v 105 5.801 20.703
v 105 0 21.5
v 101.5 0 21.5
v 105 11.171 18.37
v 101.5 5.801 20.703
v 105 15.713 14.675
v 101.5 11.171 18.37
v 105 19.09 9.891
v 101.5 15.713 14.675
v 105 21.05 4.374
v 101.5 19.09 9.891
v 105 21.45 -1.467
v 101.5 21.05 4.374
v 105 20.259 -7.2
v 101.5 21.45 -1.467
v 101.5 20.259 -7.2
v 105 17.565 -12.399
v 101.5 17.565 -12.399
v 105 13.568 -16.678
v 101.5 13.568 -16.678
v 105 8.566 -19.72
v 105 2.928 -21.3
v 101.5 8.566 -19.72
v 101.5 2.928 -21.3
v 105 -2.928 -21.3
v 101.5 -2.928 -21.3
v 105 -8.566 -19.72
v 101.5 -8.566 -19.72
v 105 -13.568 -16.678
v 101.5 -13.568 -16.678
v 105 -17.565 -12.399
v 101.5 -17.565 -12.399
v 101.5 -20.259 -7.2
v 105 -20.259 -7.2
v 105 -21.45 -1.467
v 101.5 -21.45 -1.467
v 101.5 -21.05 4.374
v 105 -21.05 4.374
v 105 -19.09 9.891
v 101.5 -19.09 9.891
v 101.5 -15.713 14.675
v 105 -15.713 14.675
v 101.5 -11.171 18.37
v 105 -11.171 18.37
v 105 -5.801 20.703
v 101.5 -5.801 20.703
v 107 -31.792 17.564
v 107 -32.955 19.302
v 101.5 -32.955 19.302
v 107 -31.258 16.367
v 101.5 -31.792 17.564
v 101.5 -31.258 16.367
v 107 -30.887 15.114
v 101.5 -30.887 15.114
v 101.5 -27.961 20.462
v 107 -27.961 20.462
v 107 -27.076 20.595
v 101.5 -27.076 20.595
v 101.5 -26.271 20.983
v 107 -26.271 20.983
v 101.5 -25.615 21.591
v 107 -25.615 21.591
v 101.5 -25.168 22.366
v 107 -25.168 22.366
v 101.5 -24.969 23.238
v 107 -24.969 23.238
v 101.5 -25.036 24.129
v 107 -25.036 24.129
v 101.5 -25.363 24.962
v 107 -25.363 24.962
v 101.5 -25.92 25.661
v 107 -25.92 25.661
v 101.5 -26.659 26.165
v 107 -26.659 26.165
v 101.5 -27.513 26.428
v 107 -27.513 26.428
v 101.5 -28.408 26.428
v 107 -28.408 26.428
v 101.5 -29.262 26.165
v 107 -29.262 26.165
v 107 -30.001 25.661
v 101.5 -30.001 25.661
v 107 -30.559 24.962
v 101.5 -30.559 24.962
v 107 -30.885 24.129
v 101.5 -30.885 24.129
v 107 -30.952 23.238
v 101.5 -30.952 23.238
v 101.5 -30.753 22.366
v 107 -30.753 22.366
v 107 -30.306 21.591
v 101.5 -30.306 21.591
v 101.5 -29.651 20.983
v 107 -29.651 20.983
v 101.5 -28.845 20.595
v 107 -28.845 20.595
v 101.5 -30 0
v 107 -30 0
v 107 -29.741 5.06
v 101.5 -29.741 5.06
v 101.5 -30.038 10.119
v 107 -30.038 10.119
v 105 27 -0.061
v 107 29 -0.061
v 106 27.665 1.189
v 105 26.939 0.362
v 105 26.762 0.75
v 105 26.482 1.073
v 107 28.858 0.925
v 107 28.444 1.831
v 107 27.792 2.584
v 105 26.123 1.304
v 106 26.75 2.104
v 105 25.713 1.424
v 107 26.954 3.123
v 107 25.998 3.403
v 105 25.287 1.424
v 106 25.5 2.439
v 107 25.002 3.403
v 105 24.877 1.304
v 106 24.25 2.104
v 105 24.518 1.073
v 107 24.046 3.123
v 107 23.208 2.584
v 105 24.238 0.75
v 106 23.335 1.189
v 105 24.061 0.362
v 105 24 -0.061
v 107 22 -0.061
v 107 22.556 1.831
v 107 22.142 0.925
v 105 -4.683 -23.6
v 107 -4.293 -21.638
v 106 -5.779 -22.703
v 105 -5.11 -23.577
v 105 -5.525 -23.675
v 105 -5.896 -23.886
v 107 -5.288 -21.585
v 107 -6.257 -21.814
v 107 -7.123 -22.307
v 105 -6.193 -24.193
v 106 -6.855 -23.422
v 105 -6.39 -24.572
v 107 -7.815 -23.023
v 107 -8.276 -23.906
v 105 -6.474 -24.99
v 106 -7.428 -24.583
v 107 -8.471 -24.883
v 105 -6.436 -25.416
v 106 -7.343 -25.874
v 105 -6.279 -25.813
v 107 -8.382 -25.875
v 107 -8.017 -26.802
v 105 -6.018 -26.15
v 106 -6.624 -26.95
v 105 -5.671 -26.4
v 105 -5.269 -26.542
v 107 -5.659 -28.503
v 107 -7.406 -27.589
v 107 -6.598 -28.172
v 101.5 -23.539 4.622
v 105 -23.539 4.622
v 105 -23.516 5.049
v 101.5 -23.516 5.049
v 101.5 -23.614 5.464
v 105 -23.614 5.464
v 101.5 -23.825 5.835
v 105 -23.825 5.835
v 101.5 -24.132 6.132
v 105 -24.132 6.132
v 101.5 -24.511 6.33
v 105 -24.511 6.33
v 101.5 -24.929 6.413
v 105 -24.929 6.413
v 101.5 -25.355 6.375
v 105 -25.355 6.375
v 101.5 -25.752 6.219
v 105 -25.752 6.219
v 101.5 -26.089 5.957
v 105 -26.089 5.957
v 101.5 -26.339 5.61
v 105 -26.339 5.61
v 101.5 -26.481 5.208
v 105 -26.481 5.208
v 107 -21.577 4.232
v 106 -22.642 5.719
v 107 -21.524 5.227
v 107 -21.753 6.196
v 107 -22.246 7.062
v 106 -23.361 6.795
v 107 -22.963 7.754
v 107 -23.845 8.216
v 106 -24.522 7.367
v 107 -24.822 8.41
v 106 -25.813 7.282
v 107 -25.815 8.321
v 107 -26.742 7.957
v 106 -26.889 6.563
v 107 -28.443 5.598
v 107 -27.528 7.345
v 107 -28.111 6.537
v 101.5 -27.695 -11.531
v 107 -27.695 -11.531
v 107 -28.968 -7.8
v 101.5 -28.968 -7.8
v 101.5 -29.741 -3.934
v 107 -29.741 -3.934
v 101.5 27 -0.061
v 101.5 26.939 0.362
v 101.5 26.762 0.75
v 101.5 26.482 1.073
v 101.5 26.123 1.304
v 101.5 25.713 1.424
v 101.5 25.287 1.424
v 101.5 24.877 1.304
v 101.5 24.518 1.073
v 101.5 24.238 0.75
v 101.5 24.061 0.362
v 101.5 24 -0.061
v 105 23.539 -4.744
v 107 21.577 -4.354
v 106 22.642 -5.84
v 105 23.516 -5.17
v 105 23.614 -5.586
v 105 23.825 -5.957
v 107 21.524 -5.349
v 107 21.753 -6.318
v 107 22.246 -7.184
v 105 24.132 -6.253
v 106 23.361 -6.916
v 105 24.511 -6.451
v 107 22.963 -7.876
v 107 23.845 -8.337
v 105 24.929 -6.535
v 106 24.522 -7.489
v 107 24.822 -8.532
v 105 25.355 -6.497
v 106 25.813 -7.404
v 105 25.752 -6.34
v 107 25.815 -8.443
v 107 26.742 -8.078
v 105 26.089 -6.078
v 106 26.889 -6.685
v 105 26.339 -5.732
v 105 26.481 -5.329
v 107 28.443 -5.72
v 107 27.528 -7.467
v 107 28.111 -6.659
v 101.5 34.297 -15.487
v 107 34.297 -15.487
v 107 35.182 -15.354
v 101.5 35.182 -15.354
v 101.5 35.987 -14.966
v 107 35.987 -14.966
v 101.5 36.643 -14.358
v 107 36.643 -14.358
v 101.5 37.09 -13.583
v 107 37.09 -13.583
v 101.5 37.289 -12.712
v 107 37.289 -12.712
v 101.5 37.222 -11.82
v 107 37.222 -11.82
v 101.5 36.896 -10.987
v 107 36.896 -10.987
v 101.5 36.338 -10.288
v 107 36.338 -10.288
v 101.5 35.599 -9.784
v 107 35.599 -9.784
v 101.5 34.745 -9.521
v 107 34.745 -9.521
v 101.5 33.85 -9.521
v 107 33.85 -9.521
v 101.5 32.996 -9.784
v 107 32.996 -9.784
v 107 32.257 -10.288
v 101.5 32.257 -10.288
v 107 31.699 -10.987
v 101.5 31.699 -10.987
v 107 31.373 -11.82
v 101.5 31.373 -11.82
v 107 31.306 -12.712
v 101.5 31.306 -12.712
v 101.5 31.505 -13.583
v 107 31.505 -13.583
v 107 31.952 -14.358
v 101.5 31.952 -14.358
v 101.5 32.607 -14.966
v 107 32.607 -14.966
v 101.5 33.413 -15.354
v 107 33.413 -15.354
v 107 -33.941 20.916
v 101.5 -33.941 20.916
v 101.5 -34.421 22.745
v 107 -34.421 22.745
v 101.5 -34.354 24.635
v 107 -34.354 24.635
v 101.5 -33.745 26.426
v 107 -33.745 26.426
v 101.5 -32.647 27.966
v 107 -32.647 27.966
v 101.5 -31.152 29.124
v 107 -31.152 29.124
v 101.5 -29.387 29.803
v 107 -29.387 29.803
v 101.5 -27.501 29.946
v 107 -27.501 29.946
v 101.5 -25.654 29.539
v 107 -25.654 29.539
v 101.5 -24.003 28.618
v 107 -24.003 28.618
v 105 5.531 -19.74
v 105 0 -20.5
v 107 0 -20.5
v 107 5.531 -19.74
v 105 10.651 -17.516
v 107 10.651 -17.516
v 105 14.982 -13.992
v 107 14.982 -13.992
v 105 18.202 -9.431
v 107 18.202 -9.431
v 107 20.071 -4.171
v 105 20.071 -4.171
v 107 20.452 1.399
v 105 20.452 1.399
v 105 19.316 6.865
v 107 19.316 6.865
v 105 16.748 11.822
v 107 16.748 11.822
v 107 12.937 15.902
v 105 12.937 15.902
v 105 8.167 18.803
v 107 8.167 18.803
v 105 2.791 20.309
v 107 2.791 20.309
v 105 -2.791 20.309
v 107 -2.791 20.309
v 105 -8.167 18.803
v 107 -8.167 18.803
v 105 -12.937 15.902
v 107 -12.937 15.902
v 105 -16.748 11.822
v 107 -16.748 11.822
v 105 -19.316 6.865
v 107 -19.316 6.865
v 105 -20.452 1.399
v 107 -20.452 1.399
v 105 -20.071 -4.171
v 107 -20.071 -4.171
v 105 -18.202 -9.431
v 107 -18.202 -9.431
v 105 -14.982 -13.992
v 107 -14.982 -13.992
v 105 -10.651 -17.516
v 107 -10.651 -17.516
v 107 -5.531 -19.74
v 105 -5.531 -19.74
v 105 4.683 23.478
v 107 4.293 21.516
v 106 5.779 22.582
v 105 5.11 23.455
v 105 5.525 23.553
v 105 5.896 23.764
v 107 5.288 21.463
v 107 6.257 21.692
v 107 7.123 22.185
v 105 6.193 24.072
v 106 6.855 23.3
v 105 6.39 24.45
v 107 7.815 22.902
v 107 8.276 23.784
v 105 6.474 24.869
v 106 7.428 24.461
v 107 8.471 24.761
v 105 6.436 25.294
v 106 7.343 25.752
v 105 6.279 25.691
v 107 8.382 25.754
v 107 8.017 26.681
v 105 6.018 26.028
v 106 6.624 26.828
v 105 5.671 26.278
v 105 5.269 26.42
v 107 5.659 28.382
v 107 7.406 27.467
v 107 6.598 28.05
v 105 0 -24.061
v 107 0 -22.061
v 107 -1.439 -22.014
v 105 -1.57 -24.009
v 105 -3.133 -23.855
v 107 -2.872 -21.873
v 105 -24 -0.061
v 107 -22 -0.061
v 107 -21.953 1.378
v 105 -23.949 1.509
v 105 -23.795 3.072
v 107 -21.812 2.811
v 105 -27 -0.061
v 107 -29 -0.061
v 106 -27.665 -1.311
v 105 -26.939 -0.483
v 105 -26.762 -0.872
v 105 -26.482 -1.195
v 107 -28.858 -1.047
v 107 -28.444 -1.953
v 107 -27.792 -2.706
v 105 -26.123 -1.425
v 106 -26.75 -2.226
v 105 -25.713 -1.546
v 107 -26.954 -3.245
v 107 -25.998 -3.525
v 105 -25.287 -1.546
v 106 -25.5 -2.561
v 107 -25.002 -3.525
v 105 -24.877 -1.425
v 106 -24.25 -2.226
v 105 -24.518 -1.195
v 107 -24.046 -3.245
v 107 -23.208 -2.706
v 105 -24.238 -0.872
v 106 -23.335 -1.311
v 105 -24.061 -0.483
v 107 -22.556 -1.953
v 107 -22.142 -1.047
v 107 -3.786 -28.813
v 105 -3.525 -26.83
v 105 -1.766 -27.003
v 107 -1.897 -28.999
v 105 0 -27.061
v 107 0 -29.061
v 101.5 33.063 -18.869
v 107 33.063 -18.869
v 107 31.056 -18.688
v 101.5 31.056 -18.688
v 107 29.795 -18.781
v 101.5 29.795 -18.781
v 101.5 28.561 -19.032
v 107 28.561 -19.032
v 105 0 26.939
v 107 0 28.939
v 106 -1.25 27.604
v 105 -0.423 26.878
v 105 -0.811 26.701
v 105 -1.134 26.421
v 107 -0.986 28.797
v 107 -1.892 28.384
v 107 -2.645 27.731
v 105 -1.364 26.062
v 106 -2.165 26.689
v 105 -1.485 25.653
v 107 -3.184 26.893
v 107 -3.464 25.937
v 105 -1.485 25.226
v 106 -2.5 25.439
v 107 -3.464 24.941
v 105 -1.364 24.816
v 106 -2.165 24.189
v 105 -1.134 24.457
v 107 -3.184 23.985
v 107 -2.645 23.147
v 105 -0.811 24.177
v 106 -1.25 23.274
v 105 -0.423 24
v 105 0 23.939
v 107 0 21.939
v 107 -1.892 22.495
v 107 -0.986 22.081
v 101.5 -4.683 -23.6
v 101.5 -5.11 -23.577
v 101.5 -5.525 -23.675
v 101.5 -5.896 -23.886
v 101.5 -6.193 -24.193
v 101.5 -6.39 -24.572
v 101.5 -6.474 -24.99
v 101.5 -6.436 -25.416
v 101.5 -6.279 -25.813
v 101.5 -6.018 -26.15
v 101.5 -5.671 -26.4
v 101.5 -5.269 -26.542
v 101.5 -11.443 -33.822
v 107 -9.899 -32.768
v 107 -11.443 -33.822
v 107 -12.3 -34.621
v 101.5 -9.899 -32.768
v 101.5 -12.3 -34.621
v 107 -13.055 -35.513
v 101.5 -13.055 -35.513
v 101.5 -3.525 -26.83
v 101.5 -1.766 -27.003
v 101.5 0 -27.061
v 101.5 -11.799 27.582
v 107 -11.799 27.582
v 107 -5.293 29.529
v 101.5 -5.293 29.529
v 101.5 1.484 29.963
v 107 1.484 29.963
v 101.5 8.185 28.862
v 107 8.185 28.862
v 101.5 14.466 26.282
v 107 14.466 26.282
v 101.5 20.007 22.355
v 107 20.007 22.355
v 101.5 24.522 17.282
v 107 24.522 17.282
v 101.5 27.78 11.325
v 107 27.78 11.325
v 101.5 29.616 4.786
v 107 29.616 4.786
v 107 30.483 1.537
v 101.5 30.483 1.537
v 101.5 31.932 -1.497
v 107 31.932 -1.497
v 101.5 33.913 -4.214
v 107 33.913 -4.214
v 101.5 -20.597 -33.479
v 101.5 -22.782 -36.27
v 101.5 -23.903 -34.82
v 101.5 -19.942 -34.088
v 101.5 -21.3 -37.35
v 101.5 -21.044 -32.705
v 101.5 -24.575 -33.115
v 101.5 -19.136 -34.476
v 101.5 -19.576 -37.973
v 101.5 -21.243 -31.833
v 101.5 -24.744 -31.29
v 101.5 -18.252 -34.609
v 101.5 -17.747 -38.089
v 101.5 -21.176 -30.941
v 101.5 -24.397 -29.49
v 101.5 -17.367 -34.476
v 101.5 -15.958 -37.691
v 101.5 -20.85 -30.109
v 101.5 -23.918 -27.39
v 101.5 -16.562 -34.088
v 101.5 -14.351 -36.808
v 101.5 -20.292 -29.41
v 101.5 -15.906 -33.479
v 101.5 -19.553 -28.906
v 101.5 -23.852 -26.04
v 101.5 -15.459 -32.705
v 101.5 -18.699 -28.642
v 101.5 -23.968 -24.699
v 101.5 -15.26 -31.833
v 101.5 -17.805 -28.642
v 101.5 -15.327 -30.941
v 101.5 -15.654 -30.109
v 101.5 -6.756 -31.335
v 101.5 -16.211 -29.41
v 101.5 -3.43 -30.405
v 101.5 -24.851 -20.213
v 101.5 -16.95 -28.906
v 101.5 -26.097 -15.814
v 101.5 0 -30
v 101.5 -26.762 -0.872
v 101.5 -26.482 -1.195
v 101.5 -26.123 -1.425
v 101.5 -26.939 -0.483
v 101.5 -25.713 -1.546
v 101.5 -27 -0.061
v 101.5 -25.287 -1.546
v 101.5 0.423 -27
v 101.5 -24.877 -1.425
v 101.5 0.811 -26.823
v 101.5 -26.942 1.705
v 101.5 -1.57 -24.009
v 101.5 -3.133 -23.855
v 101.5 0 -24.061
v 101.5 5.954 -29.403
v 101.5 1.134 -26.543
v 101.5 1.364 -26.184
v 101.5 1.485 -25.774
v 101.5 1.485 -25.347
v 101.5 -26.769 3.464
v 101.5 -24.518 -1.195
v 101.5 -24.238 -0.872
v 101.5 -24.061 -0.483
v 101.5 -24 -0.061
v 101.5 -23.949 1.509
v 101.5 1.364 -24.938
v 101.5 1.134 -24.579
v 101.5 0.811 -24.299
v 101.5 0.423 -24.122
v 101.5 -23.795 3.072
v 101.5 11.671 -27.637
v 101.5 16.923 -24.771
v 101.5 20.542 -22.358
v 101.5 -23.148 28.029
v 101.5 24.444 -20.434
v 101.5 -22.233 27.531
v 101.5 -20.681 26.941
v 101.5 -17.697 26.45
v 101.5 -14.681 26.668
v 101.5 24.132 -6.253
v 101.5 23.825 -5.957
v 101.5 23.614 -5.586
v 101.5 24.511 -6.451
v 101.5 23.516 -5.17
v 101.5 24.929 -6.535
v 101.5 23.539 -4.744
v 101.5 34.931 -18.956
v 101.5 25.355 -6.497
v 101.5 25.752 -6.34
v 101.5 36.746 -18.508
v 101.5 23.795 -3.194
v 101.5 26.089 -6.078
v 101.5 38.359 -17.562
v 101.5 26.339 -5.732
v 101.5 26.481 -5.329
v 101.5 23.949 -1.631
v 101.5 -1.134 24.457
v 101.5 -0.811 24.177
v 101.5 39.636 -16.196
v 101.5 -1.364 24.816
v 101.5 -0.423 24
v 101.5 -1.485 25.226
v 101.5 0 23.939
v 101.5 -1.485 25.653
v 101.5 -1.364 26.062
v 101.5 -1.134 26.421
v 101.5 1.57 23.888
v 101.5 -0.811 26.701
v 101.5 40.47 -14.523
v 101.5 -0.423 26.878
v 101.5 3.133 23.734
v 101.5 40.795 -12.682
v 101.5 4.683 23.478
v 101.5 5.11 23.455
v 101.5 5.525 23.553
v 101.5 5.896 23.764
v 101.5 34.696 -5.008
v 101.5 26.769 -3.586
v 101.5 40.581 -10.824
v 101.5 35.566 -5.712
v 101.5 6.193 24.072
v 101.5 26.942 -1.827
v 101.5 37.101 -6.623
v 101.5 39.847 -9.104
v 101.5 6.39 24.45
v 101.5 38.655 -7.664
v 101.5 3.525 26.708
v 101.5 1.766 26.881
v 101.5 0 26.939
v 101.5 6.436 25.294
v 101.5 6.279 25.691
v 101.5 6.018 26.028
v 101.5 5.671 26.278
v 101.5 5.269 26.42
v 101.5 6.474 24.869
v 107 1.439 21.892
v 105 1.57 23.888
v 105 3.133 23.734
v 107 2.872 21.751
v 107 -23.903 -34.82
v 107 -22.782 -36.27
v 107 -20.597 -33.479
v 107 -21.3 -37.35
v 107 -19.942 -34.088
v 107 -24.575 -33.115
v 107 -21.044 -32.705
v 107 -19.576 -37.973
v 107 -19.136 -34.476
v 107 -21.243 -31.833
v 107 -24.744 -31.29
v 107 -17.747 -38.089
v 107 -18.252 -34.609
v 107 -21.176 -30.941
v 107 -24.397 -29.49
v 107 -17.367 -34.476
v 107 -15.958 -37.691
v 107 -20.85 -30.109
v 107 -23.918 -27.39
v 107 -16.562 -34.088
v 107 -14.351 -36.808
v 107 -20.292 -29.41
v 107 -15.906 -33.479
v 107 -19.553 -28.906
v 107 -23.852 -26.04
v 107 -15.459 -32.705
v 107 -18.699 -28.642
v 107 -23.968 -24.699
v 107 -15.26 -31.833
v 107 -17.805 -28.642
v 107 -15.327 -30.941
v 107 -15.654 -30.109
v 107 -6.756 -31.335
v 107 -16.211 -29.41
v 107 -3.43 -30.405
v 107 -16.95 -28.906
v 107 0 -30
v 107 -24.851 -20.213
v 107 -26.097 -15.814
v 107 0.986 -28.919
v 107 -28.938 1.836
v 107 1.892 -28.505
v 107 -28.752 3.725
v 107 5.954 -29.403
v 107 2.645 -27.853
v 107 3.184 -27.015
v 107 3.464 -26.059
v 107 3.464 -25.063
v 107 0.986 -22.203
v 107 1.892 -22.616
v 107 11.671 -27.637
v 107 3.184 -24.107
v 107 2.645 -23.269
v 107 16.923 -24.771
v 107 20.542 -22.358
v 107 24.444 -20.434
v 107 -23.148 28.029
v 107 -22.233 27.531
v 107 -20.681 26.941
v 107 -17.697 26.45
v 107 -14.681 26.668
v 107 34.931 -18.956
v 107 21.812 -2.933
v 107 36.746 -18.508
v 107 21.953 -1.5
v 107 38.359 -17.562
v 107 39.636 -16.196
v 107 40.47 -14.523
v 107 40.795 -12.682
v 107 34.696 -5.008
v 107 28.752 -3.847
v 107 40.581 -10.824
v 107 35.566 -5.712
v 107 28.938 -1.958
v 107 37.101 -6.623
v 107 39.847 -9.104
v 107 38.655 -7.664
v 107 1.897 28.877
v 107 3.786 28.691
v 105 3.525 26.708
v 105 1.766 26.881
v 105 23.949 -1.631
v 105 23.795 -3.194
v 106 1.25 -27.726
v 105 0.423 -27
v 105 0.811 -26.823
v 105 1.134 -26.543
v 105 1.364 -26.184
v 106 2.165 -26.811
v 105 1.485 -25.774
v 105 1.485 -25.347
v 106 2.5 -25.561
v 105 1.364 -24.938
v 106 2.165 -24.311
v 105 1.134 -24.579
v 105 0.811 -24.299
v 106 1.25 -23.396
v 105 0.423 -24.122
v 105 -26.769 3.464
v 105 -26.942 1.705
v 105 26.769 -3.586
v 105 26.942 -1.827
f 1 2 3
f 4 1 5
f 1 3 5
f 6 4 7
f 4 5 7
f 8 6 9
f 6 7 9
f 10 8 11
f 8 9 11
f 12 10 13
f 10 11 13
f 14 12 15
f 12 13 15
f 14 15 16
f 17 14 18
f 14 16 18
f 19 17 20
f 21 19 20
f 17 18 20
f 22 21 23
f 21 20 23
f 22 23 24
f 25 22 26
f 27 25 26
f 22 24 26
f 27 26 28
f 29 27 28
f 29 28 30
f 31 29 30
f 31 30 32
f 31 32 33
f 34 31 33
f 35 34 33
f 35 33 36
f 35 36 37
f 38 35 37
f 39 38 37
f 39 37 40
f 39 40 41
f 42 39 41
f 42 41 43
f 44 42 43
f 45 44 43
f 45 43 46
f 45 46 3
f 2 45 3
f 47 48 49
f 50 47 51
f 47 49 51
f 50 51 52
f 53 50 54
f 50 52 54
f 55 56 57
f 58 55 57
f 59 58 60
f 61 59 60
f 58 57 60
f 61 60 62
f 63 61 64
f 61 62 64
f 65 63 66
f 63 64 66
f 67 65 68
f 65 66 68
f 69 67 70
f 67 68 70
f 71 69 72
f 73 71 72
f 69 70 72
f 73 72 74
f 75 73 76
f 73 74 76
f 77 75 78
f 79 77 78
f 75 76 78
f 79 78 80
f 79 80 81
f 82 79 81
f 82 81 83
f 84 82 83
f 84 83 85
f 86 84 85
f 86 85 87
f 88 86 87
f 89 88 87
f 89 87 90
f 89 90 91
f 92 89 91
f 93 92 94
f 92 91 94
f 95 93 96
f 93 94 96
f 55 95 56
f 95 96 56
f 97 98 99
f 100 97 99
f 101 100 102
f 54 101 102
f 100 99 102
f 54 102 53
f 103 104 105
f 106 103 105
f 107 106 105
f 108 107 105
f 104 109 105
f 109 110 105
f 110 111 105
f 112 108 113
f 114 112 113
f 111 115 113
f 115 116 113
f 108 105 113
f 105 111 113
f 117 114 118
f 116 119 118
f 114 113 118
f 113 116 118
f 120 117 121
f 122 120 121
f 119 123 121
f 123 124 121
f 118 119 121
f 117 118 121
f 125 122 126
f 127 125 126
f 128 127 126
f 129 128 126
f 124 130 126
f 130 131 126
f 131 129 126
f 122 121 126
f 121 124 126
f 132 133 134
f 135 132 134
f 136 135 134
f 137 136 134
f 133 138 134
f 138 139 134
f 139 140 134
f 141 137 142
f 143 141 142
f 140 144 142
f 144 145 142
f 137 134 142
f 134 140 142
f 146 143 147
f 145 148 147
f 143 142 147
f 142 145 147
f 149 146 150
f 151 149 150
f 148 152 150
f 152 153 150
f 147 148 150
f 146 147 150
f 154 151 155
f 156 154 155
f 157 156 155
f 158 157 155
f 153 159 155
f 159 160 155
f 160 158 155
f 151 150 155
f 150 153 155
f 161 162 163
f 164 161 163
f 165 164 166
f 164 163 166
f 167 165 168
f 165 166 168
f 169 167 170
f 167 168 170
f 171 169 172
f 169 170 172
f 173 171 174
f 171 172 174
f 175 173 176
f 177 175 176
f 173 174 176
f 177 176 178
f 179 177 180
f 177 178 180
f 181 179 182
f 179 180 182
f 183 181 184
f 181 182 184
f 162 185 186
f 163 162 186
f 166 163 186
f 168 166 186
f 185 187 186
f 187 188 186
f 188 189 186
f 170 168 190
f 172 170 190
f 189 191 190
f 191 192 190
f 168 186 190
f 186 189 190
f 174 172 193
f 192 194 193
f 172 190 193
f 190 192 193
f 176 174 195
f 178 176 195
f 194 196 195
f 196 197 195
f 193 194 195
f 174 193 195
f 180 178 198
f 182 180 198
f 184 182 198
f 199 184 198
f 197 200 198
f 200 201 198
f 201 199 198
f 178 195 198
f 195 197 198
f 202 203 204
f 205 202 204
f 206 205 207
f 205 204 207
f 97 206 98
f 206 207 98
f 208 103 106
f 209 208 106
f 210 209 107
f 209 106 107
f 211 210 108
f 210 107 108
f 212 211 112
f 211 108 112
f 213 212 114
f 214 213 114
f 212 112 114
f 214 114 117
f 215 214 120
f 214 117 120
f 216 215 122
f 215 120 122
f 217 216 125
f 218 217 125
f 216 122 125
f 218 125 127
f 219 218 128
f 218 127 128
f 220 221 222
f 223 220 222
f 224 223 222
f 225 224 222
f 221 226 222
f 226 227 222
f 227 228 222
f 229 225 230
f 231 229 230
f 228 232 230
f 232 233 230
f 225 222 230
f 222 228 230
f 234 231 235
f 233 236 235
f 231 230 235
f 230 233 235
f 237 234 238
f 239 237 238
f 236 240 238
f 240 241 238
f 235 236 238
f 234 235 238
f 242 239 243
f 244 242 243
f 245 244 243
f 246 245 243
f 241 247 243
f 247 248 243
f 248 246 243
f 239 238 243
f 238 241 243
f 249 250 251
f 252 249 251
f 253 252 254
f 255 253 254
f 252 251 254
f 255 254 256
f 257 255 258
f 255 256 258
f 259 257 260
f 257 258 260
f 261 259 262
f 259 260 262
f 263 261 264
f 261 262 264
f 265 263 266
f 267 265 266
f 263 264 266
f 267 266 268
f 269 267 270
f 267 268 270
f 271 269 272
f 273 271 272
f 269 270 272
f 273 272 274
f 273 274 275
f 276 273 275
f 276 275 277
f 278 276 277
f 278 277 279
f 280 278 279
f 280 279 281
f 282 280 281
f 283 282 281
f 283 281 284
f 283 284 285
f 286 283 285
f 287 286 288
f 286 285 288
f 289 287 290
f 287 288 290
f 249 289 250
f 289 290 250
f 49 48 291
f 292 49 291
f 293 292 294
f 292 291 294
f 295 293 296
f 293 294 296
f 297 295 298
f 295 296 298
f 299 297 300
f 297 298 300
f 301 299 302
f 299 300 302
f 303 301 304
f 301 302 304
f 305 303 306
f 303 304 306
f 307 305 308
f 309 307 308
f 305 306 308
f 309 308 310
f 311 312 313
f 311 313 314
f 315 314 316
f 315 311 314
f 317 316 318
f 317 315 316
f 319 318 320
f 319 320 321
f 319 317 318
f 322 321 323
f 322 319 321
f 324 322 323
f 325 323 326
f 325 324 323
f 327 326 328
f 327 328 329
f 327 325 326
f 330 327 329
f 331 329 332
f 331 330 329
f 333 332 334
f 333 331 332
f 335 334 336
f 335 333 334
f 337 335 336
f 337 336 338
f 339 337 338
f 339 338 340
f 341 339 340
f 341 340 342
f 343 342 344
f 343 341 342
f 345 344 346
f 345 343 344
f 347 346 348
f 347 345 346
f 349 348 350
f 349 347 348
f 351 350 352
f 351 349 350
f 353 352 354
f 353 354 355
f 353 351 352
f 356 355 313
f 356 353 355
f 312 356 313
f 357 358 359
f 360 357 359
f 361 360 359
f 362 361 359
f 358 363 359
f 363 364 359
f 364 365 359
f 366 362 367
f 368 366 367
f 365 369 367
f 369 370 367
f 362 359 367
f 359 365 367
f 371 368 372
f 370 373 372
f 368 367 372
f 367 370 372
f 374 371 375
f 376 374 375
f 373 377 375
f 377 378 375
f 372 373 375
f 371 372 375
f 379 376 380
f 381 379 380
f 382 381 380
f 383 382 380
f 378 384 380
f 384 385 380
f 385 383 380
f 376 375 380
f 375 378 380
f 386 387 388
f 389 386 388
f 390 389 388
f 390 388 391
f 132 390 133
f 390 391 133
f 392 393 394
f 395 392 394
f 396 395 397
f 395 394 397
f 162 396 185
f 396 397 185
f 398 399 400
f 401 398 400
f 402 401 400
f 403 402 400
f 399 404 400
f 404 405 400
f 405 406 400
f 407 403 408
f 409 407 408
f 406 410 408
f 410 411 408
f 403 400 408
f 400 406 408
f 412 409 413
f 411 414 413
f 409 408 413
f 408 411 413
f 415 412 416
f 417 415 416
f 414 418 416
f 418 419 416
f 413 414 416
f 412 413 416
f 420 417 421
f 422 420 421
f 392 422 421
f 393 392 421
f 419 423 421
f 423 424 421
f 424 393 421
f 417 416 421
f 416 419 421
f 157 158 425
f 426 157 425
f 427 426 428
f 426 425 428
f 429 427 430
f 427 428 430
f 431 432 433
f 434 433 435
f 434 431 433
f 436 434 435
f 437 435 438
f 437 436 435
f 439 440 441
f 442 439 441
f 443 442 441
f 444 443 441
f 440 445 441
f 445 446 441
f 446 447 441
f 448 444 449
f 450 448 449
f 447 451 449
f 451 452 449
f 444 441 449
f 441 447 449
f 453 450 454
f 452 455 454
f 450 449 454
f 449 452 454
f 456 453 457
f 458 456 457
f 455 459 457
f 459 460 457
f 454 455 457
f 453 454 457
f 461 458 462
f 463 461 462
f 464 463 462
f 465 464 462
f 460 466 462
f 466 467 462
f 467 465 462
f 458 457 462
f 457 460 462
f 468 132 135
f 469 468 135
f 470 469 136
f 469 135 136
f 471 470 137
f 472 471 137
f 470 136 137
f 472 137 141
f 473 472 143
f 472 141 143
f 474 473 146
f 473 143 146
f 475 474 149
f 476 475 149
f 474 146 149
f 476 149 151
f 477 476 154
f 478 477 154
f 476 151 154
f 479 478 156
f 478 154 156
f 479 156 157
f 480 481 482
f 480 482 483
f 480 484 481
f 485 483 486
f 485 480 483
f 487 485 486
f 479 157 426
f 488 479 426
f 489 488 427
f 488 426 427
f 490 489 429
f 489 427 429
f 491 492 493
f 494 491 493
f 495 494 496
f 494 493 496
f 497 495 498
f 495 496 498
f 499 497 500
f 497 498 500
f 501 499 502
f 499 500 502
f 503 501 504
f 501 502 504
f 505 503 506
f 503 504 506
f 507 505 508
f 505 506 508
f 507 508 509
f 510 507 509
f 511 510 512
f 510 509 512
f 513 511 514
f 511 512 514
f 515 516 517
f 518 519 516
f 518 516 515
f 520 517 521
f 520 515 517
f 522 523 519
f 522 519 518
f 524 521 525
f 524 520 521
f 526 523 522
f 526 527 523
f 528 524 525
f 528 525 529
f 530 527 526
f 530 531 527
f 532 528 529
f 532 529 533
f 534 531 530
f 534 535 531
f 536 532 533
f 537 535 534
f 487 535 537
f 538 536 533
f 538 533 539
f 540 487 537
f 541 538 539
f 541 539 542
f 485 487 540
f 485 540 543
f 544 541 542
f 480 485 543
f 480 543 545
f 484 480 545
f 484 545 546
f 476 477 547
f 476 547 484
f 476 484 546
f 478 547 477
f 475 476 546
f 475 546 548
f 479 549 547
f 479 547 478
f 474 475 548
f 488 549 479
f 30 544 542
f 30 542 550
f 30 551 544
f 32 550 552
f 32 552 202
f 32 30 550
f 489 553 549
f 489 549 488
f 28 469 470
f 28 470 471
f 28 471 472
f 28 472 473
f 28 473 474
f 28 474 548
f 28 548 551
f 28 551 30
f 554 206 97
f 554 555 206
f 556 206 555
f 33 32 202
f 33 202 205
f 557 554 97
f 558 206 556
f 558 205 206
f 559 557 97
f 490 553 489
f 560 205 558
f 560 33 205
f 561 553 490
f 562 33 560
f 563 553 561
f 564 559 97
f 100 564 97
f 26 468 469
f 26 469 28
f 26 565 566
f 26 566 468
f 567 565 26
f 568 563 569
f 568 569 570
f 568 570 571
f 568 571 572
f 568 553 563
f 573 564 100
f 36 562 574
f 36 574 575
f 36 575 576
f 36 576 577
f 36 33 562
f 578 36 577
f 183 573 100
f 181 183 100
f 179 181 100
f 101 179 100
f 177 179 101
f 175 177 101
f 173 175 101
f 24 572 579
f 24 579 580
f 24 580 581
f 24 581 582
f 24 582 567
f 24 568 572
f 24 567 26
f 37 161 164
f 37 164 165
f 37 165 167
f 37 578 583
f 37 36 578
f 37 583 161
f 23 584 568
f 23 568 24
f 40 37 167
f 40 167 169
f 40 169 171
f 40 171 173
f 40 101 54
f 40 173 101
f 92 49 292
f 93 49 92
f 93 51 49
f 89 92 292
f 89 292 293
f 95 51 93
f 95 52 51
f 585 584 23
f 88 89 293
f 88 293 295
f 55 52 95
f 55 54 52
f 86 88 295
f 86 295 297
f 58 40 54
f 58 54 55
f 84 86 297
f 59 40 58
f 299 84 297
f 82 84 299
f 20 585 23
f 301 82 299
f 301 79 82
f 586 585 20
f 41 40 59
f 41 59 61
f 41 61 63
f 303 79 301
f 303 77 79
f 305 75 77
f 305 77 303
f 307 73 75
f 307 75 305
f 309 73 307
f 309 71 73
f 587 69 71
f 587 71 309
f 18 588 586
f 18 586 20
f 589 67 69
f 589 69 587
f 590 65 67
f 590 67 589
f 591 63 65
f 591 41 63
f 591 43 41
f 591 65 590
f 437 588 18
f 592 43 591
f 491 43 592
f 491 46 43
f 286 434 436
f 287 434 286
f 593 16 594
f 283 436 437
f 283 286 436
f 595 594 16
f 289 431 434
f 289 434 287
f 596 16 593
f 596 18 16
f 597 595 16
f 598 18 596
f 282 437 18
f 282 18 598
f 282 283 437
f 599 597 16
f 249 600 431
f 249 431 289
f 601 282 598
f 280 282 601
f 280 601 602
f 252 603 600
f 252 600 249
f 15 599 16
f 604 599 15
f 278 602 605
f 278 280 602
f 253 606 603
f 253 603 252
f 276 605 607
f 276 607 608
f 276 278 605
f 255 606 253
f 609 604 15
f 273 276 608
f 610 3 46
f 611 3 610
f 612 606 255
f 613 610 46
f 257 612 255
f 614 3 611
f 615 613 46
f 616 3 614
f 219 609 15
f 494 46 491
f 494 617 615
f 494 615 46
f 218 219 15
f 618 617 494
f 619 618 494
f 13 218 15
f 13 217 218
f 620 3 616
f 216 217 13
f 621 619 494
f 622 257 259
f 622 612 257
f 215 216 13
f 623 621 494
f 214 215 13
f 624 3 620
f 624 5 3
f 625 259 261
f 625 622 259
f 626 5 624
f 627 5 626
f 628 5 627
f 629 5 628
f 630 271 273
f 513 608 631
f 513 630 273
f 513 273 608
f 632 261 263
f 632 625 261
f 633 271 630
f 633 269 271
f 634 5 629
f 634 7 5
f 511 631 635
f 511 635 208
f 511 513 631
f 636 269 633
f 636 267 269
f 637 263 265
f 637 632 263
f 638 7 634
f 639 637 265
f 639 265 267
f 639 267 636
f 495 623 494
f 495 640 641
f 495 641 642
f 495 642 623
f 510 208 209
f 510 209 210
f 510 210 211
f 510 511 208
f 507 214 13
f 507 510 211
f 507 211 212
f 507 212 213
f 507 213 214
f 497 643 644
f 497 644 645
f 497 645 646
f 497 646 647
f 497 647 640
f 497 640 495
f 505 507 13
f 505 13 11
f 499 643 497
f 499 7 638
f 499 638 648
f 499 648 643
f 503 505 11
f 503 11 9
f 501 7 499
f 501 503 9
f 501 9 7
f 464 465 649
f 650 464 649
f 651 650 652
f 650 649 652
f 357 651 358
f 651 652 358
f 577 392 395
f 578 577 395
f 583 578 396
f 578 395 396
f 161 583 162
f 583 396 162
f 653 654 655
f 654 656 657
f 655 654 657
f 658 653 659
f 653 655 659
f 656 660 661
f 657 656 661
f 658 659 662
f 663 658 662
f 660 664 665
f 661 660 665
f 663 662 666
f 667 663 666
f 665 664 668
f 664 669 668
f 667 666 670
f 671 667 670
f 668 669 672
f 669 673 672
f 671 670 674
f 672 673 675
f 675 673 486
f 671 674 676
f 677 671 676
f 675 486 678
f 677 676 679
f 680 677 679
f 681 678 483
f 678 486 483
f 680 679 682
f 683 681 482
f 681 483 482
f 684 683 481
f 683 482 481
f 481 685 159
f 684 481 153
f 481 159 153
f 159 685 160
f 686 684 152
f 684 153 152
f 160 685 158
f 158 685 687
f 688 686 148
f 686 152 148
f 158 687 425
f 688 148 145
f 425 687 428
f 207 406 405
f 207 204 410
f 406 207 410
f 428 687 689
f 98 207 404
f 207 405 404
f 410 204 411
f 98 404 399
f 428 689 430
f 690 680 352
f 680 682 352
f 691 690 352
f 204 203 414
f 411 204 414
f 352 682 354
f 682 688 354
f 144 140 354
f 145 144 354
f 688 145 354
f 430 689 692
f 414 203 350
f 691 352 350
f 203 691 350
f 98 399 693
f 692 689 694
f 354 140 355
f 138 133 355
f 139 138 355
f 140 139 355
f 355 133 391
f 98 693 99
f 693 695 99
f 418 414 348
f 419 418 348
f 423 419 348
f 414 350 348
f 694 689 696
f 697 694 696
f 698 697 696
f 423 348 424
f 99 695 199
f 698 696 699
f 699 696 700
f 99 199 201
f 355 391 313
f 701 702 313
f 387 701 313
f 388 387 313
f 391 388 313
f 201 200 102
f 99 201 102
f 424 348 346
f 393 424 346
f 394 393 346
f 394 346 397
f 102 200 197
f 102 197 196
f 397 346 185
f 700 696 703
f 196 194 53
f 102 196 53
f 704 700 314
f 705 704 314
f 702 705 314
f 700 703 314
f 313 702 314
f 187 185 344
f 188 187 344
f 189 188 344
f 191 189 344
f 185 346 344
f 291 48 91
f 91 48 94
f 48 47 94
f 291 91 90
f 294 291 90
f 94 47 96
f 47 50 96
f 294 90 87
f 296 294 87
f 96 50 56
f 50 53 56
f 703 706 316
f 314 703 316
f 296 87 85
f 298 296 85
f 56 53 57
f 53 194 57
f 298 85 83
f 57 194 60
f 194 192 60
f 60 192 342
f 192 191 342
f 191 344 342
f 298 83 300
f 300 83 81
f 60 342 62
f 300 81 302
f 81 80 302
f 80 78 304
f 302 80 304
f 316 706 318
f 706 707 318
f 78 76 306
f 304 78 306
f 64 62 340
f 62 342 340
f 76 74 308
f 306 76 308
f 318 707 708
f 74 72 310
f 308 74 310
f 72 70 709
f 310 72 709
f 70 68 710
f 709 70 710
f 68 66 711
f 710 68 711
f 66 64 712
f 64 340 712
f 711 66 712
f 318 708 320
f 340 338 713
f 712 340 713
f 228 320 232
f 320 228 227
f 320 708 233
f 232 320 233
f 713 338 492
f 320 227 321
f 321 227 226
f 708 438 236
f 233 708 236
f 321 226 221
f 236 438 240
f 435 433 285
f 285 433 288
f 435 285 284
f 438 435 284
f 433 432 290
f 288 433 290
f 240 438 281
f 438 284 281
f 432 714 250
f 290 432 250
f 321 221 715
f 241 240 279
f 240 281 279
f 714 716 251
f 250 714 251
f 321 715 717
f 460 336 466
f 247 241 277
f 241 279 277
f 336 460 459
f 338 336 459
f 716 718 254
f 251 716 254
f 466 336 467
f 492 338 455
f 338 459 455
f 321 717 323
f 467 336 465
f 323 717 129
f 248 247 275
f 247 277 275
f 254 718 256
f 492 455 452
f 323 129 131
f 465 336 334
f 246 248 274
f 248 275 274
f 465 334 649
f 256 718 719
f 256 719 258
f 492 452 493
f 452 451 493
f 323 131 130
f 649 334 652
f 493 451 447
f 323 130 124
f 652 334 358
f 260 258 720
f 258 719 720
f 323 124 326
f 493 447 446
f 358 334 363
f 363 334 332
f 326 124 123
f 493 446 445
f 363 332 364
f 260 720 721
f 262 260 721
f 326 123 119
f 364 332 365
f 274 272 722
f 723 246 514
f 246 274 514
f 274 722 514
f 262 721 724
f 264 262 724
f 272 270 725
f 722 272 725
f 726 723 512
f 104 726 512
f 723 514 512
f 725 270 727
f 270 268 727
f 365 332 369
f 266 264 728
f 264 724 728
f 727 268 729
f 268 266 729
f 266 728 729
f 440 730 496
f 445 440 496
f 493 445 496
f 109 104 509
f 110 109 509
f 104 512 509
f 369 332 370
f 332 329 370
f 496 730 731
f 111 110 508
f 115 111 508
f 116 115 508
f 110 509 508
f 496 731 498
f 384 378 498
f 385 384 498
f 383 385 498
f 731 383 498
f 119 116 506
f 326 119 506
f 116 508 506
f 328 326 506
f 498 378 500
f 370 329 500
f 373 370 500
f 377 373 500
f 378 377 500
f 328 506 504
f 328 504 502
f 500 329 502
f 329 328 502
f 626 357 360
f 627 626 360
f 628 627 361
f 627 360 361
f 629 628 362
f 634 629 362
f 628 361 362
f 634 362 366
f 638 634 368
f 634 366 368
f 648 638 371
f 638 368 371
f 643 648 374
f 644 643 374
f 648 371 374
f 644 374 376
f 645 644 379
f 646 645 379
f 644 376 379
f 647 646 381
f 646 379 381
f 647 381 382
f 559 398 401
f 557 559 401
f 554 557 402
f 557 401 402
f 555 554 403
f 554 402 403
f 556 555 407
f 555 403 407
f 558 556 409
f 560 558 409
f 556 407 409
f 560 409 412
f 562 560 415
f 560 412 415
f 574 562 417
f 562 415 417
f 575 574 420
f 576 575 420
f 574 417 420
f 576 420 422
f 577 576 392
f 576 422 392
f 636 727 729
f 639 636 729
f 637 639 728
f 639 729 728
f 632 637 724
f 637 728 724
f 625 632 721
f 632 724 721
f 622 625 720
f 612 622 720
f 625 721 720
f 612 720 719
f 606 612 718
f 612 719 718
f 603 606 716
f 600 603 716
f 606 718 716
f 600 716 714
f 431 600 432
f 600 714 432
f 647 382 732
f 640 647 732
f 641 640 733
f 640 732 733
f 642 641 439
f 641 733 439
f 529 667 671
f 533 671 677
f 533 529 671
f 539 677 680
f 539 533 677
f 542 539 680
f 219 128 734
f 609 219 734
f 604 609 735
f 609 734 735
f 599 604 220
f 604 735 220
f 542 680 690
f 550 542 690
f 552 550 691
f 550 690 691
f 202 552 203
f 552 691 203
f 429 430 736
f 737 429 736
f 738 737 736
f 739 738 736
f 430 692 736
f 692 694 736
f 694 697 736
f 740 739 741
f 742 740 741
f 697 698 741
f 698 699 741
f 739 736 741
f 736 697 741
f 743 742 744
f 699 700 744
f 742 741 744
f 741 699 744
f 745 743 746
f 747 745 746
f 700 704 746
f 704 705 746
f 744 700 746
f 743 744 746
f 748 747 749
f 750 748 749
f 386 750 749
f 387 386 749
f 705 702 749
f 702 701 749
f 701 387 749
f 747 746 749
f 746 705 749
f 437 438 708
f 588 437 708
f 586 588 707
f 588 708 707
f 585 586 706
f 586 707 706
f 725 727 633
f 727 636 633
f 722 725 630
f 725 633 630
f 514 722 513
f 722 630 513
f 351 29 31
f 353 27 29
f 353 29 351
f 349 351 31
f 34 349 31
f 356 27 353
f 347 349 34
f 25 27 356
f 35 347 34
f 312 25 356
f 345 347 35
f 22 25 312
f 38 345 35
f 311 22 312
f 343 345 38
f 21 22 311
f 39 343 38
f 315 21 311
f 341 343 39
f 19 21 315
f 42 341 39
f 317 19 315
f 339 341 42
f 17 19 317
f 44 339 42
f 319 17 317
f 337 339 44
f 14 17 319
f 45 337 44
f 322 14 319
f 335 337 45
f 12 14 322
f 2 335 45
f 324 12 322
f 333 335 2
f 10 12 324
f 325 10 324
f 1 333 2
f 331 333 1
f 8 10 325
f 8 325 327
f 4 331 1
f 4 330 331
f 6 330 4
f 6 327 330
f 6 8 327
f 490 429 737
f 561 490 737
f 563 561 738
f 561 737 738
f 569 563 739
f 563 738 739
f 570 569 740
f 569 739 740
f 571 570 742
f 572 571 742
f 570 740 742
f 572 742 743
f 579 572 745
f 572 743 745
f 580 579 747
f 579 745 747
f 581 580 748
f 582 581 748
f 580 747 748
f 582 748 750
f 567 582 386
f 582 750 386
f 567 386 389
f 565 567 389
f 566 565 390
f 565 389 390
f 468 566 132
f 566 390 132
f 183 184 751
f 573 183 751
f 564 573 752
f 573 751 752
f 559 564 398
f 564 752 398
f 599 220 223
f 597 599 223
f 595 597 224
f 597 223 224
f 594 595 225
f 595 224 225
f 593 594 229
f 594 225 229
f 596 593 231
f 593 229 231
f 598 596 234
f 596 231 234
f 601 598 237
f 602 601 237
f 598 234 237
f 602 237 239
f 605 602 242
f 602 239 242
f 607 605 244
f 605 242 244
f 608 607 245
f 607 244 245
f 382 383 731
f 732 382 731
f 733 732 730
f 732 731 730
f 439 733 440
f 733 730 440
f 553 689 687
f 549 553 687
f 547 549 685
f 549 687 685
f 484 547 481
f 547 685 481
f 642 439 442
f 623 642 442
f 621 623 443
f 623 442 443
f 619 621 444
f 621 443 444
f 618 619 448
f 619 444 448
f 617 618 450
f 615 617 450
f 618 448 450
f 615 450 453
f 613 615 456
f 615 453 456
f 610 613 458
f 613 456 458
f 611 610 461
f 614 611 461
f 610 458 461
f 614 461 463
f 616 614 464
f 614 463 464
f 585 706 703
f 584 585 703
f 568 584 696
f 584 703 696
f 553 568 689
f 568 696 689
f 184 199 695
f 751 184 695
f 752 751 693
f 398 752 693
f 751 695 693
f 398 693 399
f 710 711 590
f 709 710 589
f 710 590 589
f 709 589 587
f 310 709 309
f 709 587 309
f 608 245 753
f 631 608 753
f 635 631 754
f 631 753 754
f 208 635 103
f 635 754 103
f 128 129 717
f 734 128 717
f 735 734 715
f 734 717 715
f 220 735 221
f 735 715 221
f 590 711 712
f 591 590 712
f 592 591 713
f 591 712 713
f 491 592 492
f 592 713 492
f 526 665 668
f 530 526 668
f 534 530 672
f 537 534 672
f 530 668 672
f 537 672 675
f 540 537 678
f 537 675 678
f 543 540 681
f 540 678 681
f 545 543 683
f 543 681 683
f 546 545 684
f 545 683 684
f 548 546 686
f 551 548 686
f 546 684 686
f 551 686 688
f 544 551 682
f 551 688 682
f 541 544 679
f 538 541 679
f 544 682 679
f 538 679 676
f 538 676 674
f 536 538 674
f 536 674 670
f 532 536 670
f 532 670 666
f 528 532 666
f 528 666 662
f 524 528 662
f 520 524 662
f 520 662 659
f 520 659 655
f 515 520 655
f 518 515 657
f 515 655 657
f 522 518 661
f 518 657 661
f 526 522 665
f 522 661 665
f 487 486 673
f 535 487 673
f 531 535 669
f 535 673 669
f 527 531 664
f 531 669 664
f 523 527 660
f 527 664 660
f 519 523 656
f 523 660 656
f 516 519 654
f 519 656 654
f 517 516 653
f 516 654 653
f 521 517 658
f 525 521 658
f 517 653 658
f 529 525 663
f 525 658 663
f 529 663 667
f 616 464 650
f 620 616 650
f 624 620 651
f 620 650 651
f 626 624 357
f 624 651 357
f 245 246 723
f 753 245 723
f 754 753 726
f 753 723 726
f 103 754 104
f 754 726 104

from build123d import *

# Parameters (mm, degrees)
ESQUISSE1_R             = 21.5
ESQUISSE1_R_2           = 20.5
BOSS_EXTRU_1_DEPTH      = 107
ESQUISSE2_R             = 20.5
ESQUISSE2_R_2           = 3
BOSS_EXTRU_2_DEPTH      = 5.5
CHANFREIN1_SIZE         = 2
CONG_1_R                = 10
ESQUISSE4_R             = 21.5
ESQUISSE4_R_2           = 20.5
ENL_V_MAT_EXTRU_2_DEPTH = 105


with BuildPart() as part:
    # Esquisse1 → Boss.-Extru.1 (new body)
    with BuildSketch(Plane(origin=(0, 0, 0), x_dir=(0, 0, -1), z_dir=(1, 0, 0))):
        Circle(ESQUISSE1_R)
        Circle(ESQUISSE1_R_2, mode=Mode.SUBTRACT)
    extrude(amount=BOSS_EXTRU_1_DEPTH)

    # Esquisse2 → Boss.-Extru.2 (add)
    with BuildSketch(Plane(origin=(107, 0, 0), x_dir=(0, 0, -1), z_dir=(1, 0, 0))):
        with BuildLine():
            ThreePointArc((6.205859778, 35.968559944), (14.711152146, 40.405222466), (18.372871483, 31.538668226))
            ThreePointArc((18.372871483, 31.538668226), (20.689295332, 23.844460332), (24.771129004, 16.923095695))
            ThreePointArc((24.771129004, 16.923095695), (28.662988941, 8.856244404), (30, 0))
            ThreePointArc((30, 0), (31.244976727, -6.50402438), (34.345135803, -12.355632184))
            ThreePointArc((34.345135803, -12.355632184), (37.237952026, -21.501974999), (27.870359387, -23.568900433))
            ThreePointArc((27.870359387, -23.568900433), (19.545131967, -25.015822985), (11.531193363, -27.69533498))
            ThreePointArc((11.531193363, -27.69533498), (5.879623738, -29.41819207), (0, -30))
            ThreePointArc((0, -30), (-9.148577813, -29.937932347), (-18.130212507, -31.678784611))
            ThreePointArc((-18.130212507, -31.678784611), (-27.639867217, -32.939911054), (-28.049234329, -23.355737059))
            ThreePointArc((-28.049234329, -23.355737059), (-26.447464851, -17.632677908), (-27.582285912, -11.799046736))
            ThreePointArc((-27.582285912, -11.799046736), (-26.28171566, 14.466216574), (-4.786405344, 29.615710761))
            ThreePointArc((-4.786405344, 29.615710761), (1.280514923, 31.804507658), (6.205859778, 35.968559944))
        make_face()
        Circle(ESQUISSE2_R, mode=Mode.SUBTRACT)
        with Locations((-23.461747754, -27.960622174)):
            Circle(ESQUISSE2_R_2, mode=Mode.SUBTRACT)
        with Locations((31.608959278, -18.251676453)):
            Circle(ESQUISSE2_R_2, mode=Mode.SUBTRACT)
        with Locations((12.487373333, 34.29745628)):
            Circle(ESQUISSE2_R_2, mode=Mode.SUBTRACT)
        with BuildLine():
            ThreePointArc((-26.420087149, 5.268613512), (-26.8090472, 2.647058824), (-26.939118291, 0))
            ThreePointArc((-26.939118291, 0), (-25.439118291, -1.5), (-23.939118291, 0))
            ThreePointArc((-23.939118291, 0), (-23.823499543, 2.352941176), (-23.477757276, 4.68321201))
            ThreePointArc((-23.477757276, 4.68321201), (-24.656221462, 6.447077698), (-26.420087149, 5.268613512))
        make_face(mode=Mode.SUBTRACT)
        with BuildLine():
            ThreePointArc((5.329495221, 26.480968858), (2.707940533, 26.869928909), (0.060881709, 27))
            ThreePointArc((0.060881709, 27), (-1.439118291, 25.5), (0.060881709, 24))
            ThreePointArc((0.060881709, 24), (2.413822886, 23.884381253), (4.74409372, 23.538638985))
            ThreePointArc((4.74409372, 23.538638985), (6.507959407, 24.717103171), (5.329495221, 26.480968858))
        make_face(mode=Mode.SUBTRACT)
        with BuildLine():
            ThreePointArc((26.541850567, -5.268613512), (26.930810618, -2.647058824), (27.060881709, 0))
            ThreePointArc((27.060881709, 0), (25.560881709, 1.5), (24.060881709, 0))
            ThreePointArc((24.060881709, 0), (23.945262962, -2.352941176), (23.599520694, -4.68321201))
            ThreePointArc((23.599520694, -4.68321201), (24.77798488, -6.447077698), (26.541850567, -5.268613512))
        make_face(mode=Mode.SUBTRACT)
        with BuildLine():
            ThreePointArc((-5.207731802, -26.480968858), (-2.586177114, -26.869928909), (0.060881709, -27))
            ThreePointArc((0.060881709, -27), (1.560881709, -25.5), (0.060881709, -24))
            ThreePointArc((0.060881709, -24), (-2.292059467, -23.884381253), (-4.622330301, -23.538638985))
            ThreePointArc((-4.622330301, -23.538638985), (-6.386195988, -24.717103171), (-5.207731802, -26.480968858))
        make_face(mode=Mode.SUBTRACT)
    extrude(amount=-BOSS_EXTRU_2_DEPTH)

    # Chanfrein1
    chanfrein1_edges = [part.edges().sort_by_distance(p)[0] for p in [
        (107, 6.447077698, 24.656221462),
        (107, 2.352941176, 23.823499543),
        (107, -1.5, 25.439118291),
        (107, 2.647058824, 26.8090472),
        (107, 24.717103171, -6.507959407),
        (107, 23.884381253, -2.413822886),
        (107, 25.5, 1.439118291),
        (107, 26.869928909, -2.707940533),
        (107, -6.447077698, -24.77798488),
        (107, -2.352941176, -23.945262962),
        (107, 1.5, -25.560881709),
        (107, -2.647058824, -26.930810618),
        (107, -24.717103171, 6.386195988),
        (107, -23.884381253, 2.292059467),
        (107, -25.5, -1.560881709),
        (107, -26.869928909, 2.586177114),
    ]]
    chamfer(chanfrein1_edges, length=CHANFREIN1_SIZE)

    # Congé1
    cong_1_edges = [part.edges().sort_by_distance(p)[0] for p in [
        (104.25, 35.968559944, -6.205859778),
        (104.25, 31.538668226, -18.372871483),
        (104.25, -12.355632184, -34.345135803),
        (104.25, -23.568900433, -27.870359387),
        (104.25, -31.678784611, 18.130212507),
        (104.25, -23.355737059, 28.049234329),
    ]]
    fillet(cong_1_edges, radius=CONG_1_R)

    # Esquisse4 → Enlèv. mat.-Extru.2 (cut)
    with BuildSketch(Plane.ZY):
        Circle(ESQUISSE4_R)
        Circle(ESQUISSE4_R_2, mode=Mode.SUBTRACT)
    extrude(amount=-ENL_V_MAT_EXTRU_2_DEPTH, mode=Mode.SUBTRACT)


solid = part.part
